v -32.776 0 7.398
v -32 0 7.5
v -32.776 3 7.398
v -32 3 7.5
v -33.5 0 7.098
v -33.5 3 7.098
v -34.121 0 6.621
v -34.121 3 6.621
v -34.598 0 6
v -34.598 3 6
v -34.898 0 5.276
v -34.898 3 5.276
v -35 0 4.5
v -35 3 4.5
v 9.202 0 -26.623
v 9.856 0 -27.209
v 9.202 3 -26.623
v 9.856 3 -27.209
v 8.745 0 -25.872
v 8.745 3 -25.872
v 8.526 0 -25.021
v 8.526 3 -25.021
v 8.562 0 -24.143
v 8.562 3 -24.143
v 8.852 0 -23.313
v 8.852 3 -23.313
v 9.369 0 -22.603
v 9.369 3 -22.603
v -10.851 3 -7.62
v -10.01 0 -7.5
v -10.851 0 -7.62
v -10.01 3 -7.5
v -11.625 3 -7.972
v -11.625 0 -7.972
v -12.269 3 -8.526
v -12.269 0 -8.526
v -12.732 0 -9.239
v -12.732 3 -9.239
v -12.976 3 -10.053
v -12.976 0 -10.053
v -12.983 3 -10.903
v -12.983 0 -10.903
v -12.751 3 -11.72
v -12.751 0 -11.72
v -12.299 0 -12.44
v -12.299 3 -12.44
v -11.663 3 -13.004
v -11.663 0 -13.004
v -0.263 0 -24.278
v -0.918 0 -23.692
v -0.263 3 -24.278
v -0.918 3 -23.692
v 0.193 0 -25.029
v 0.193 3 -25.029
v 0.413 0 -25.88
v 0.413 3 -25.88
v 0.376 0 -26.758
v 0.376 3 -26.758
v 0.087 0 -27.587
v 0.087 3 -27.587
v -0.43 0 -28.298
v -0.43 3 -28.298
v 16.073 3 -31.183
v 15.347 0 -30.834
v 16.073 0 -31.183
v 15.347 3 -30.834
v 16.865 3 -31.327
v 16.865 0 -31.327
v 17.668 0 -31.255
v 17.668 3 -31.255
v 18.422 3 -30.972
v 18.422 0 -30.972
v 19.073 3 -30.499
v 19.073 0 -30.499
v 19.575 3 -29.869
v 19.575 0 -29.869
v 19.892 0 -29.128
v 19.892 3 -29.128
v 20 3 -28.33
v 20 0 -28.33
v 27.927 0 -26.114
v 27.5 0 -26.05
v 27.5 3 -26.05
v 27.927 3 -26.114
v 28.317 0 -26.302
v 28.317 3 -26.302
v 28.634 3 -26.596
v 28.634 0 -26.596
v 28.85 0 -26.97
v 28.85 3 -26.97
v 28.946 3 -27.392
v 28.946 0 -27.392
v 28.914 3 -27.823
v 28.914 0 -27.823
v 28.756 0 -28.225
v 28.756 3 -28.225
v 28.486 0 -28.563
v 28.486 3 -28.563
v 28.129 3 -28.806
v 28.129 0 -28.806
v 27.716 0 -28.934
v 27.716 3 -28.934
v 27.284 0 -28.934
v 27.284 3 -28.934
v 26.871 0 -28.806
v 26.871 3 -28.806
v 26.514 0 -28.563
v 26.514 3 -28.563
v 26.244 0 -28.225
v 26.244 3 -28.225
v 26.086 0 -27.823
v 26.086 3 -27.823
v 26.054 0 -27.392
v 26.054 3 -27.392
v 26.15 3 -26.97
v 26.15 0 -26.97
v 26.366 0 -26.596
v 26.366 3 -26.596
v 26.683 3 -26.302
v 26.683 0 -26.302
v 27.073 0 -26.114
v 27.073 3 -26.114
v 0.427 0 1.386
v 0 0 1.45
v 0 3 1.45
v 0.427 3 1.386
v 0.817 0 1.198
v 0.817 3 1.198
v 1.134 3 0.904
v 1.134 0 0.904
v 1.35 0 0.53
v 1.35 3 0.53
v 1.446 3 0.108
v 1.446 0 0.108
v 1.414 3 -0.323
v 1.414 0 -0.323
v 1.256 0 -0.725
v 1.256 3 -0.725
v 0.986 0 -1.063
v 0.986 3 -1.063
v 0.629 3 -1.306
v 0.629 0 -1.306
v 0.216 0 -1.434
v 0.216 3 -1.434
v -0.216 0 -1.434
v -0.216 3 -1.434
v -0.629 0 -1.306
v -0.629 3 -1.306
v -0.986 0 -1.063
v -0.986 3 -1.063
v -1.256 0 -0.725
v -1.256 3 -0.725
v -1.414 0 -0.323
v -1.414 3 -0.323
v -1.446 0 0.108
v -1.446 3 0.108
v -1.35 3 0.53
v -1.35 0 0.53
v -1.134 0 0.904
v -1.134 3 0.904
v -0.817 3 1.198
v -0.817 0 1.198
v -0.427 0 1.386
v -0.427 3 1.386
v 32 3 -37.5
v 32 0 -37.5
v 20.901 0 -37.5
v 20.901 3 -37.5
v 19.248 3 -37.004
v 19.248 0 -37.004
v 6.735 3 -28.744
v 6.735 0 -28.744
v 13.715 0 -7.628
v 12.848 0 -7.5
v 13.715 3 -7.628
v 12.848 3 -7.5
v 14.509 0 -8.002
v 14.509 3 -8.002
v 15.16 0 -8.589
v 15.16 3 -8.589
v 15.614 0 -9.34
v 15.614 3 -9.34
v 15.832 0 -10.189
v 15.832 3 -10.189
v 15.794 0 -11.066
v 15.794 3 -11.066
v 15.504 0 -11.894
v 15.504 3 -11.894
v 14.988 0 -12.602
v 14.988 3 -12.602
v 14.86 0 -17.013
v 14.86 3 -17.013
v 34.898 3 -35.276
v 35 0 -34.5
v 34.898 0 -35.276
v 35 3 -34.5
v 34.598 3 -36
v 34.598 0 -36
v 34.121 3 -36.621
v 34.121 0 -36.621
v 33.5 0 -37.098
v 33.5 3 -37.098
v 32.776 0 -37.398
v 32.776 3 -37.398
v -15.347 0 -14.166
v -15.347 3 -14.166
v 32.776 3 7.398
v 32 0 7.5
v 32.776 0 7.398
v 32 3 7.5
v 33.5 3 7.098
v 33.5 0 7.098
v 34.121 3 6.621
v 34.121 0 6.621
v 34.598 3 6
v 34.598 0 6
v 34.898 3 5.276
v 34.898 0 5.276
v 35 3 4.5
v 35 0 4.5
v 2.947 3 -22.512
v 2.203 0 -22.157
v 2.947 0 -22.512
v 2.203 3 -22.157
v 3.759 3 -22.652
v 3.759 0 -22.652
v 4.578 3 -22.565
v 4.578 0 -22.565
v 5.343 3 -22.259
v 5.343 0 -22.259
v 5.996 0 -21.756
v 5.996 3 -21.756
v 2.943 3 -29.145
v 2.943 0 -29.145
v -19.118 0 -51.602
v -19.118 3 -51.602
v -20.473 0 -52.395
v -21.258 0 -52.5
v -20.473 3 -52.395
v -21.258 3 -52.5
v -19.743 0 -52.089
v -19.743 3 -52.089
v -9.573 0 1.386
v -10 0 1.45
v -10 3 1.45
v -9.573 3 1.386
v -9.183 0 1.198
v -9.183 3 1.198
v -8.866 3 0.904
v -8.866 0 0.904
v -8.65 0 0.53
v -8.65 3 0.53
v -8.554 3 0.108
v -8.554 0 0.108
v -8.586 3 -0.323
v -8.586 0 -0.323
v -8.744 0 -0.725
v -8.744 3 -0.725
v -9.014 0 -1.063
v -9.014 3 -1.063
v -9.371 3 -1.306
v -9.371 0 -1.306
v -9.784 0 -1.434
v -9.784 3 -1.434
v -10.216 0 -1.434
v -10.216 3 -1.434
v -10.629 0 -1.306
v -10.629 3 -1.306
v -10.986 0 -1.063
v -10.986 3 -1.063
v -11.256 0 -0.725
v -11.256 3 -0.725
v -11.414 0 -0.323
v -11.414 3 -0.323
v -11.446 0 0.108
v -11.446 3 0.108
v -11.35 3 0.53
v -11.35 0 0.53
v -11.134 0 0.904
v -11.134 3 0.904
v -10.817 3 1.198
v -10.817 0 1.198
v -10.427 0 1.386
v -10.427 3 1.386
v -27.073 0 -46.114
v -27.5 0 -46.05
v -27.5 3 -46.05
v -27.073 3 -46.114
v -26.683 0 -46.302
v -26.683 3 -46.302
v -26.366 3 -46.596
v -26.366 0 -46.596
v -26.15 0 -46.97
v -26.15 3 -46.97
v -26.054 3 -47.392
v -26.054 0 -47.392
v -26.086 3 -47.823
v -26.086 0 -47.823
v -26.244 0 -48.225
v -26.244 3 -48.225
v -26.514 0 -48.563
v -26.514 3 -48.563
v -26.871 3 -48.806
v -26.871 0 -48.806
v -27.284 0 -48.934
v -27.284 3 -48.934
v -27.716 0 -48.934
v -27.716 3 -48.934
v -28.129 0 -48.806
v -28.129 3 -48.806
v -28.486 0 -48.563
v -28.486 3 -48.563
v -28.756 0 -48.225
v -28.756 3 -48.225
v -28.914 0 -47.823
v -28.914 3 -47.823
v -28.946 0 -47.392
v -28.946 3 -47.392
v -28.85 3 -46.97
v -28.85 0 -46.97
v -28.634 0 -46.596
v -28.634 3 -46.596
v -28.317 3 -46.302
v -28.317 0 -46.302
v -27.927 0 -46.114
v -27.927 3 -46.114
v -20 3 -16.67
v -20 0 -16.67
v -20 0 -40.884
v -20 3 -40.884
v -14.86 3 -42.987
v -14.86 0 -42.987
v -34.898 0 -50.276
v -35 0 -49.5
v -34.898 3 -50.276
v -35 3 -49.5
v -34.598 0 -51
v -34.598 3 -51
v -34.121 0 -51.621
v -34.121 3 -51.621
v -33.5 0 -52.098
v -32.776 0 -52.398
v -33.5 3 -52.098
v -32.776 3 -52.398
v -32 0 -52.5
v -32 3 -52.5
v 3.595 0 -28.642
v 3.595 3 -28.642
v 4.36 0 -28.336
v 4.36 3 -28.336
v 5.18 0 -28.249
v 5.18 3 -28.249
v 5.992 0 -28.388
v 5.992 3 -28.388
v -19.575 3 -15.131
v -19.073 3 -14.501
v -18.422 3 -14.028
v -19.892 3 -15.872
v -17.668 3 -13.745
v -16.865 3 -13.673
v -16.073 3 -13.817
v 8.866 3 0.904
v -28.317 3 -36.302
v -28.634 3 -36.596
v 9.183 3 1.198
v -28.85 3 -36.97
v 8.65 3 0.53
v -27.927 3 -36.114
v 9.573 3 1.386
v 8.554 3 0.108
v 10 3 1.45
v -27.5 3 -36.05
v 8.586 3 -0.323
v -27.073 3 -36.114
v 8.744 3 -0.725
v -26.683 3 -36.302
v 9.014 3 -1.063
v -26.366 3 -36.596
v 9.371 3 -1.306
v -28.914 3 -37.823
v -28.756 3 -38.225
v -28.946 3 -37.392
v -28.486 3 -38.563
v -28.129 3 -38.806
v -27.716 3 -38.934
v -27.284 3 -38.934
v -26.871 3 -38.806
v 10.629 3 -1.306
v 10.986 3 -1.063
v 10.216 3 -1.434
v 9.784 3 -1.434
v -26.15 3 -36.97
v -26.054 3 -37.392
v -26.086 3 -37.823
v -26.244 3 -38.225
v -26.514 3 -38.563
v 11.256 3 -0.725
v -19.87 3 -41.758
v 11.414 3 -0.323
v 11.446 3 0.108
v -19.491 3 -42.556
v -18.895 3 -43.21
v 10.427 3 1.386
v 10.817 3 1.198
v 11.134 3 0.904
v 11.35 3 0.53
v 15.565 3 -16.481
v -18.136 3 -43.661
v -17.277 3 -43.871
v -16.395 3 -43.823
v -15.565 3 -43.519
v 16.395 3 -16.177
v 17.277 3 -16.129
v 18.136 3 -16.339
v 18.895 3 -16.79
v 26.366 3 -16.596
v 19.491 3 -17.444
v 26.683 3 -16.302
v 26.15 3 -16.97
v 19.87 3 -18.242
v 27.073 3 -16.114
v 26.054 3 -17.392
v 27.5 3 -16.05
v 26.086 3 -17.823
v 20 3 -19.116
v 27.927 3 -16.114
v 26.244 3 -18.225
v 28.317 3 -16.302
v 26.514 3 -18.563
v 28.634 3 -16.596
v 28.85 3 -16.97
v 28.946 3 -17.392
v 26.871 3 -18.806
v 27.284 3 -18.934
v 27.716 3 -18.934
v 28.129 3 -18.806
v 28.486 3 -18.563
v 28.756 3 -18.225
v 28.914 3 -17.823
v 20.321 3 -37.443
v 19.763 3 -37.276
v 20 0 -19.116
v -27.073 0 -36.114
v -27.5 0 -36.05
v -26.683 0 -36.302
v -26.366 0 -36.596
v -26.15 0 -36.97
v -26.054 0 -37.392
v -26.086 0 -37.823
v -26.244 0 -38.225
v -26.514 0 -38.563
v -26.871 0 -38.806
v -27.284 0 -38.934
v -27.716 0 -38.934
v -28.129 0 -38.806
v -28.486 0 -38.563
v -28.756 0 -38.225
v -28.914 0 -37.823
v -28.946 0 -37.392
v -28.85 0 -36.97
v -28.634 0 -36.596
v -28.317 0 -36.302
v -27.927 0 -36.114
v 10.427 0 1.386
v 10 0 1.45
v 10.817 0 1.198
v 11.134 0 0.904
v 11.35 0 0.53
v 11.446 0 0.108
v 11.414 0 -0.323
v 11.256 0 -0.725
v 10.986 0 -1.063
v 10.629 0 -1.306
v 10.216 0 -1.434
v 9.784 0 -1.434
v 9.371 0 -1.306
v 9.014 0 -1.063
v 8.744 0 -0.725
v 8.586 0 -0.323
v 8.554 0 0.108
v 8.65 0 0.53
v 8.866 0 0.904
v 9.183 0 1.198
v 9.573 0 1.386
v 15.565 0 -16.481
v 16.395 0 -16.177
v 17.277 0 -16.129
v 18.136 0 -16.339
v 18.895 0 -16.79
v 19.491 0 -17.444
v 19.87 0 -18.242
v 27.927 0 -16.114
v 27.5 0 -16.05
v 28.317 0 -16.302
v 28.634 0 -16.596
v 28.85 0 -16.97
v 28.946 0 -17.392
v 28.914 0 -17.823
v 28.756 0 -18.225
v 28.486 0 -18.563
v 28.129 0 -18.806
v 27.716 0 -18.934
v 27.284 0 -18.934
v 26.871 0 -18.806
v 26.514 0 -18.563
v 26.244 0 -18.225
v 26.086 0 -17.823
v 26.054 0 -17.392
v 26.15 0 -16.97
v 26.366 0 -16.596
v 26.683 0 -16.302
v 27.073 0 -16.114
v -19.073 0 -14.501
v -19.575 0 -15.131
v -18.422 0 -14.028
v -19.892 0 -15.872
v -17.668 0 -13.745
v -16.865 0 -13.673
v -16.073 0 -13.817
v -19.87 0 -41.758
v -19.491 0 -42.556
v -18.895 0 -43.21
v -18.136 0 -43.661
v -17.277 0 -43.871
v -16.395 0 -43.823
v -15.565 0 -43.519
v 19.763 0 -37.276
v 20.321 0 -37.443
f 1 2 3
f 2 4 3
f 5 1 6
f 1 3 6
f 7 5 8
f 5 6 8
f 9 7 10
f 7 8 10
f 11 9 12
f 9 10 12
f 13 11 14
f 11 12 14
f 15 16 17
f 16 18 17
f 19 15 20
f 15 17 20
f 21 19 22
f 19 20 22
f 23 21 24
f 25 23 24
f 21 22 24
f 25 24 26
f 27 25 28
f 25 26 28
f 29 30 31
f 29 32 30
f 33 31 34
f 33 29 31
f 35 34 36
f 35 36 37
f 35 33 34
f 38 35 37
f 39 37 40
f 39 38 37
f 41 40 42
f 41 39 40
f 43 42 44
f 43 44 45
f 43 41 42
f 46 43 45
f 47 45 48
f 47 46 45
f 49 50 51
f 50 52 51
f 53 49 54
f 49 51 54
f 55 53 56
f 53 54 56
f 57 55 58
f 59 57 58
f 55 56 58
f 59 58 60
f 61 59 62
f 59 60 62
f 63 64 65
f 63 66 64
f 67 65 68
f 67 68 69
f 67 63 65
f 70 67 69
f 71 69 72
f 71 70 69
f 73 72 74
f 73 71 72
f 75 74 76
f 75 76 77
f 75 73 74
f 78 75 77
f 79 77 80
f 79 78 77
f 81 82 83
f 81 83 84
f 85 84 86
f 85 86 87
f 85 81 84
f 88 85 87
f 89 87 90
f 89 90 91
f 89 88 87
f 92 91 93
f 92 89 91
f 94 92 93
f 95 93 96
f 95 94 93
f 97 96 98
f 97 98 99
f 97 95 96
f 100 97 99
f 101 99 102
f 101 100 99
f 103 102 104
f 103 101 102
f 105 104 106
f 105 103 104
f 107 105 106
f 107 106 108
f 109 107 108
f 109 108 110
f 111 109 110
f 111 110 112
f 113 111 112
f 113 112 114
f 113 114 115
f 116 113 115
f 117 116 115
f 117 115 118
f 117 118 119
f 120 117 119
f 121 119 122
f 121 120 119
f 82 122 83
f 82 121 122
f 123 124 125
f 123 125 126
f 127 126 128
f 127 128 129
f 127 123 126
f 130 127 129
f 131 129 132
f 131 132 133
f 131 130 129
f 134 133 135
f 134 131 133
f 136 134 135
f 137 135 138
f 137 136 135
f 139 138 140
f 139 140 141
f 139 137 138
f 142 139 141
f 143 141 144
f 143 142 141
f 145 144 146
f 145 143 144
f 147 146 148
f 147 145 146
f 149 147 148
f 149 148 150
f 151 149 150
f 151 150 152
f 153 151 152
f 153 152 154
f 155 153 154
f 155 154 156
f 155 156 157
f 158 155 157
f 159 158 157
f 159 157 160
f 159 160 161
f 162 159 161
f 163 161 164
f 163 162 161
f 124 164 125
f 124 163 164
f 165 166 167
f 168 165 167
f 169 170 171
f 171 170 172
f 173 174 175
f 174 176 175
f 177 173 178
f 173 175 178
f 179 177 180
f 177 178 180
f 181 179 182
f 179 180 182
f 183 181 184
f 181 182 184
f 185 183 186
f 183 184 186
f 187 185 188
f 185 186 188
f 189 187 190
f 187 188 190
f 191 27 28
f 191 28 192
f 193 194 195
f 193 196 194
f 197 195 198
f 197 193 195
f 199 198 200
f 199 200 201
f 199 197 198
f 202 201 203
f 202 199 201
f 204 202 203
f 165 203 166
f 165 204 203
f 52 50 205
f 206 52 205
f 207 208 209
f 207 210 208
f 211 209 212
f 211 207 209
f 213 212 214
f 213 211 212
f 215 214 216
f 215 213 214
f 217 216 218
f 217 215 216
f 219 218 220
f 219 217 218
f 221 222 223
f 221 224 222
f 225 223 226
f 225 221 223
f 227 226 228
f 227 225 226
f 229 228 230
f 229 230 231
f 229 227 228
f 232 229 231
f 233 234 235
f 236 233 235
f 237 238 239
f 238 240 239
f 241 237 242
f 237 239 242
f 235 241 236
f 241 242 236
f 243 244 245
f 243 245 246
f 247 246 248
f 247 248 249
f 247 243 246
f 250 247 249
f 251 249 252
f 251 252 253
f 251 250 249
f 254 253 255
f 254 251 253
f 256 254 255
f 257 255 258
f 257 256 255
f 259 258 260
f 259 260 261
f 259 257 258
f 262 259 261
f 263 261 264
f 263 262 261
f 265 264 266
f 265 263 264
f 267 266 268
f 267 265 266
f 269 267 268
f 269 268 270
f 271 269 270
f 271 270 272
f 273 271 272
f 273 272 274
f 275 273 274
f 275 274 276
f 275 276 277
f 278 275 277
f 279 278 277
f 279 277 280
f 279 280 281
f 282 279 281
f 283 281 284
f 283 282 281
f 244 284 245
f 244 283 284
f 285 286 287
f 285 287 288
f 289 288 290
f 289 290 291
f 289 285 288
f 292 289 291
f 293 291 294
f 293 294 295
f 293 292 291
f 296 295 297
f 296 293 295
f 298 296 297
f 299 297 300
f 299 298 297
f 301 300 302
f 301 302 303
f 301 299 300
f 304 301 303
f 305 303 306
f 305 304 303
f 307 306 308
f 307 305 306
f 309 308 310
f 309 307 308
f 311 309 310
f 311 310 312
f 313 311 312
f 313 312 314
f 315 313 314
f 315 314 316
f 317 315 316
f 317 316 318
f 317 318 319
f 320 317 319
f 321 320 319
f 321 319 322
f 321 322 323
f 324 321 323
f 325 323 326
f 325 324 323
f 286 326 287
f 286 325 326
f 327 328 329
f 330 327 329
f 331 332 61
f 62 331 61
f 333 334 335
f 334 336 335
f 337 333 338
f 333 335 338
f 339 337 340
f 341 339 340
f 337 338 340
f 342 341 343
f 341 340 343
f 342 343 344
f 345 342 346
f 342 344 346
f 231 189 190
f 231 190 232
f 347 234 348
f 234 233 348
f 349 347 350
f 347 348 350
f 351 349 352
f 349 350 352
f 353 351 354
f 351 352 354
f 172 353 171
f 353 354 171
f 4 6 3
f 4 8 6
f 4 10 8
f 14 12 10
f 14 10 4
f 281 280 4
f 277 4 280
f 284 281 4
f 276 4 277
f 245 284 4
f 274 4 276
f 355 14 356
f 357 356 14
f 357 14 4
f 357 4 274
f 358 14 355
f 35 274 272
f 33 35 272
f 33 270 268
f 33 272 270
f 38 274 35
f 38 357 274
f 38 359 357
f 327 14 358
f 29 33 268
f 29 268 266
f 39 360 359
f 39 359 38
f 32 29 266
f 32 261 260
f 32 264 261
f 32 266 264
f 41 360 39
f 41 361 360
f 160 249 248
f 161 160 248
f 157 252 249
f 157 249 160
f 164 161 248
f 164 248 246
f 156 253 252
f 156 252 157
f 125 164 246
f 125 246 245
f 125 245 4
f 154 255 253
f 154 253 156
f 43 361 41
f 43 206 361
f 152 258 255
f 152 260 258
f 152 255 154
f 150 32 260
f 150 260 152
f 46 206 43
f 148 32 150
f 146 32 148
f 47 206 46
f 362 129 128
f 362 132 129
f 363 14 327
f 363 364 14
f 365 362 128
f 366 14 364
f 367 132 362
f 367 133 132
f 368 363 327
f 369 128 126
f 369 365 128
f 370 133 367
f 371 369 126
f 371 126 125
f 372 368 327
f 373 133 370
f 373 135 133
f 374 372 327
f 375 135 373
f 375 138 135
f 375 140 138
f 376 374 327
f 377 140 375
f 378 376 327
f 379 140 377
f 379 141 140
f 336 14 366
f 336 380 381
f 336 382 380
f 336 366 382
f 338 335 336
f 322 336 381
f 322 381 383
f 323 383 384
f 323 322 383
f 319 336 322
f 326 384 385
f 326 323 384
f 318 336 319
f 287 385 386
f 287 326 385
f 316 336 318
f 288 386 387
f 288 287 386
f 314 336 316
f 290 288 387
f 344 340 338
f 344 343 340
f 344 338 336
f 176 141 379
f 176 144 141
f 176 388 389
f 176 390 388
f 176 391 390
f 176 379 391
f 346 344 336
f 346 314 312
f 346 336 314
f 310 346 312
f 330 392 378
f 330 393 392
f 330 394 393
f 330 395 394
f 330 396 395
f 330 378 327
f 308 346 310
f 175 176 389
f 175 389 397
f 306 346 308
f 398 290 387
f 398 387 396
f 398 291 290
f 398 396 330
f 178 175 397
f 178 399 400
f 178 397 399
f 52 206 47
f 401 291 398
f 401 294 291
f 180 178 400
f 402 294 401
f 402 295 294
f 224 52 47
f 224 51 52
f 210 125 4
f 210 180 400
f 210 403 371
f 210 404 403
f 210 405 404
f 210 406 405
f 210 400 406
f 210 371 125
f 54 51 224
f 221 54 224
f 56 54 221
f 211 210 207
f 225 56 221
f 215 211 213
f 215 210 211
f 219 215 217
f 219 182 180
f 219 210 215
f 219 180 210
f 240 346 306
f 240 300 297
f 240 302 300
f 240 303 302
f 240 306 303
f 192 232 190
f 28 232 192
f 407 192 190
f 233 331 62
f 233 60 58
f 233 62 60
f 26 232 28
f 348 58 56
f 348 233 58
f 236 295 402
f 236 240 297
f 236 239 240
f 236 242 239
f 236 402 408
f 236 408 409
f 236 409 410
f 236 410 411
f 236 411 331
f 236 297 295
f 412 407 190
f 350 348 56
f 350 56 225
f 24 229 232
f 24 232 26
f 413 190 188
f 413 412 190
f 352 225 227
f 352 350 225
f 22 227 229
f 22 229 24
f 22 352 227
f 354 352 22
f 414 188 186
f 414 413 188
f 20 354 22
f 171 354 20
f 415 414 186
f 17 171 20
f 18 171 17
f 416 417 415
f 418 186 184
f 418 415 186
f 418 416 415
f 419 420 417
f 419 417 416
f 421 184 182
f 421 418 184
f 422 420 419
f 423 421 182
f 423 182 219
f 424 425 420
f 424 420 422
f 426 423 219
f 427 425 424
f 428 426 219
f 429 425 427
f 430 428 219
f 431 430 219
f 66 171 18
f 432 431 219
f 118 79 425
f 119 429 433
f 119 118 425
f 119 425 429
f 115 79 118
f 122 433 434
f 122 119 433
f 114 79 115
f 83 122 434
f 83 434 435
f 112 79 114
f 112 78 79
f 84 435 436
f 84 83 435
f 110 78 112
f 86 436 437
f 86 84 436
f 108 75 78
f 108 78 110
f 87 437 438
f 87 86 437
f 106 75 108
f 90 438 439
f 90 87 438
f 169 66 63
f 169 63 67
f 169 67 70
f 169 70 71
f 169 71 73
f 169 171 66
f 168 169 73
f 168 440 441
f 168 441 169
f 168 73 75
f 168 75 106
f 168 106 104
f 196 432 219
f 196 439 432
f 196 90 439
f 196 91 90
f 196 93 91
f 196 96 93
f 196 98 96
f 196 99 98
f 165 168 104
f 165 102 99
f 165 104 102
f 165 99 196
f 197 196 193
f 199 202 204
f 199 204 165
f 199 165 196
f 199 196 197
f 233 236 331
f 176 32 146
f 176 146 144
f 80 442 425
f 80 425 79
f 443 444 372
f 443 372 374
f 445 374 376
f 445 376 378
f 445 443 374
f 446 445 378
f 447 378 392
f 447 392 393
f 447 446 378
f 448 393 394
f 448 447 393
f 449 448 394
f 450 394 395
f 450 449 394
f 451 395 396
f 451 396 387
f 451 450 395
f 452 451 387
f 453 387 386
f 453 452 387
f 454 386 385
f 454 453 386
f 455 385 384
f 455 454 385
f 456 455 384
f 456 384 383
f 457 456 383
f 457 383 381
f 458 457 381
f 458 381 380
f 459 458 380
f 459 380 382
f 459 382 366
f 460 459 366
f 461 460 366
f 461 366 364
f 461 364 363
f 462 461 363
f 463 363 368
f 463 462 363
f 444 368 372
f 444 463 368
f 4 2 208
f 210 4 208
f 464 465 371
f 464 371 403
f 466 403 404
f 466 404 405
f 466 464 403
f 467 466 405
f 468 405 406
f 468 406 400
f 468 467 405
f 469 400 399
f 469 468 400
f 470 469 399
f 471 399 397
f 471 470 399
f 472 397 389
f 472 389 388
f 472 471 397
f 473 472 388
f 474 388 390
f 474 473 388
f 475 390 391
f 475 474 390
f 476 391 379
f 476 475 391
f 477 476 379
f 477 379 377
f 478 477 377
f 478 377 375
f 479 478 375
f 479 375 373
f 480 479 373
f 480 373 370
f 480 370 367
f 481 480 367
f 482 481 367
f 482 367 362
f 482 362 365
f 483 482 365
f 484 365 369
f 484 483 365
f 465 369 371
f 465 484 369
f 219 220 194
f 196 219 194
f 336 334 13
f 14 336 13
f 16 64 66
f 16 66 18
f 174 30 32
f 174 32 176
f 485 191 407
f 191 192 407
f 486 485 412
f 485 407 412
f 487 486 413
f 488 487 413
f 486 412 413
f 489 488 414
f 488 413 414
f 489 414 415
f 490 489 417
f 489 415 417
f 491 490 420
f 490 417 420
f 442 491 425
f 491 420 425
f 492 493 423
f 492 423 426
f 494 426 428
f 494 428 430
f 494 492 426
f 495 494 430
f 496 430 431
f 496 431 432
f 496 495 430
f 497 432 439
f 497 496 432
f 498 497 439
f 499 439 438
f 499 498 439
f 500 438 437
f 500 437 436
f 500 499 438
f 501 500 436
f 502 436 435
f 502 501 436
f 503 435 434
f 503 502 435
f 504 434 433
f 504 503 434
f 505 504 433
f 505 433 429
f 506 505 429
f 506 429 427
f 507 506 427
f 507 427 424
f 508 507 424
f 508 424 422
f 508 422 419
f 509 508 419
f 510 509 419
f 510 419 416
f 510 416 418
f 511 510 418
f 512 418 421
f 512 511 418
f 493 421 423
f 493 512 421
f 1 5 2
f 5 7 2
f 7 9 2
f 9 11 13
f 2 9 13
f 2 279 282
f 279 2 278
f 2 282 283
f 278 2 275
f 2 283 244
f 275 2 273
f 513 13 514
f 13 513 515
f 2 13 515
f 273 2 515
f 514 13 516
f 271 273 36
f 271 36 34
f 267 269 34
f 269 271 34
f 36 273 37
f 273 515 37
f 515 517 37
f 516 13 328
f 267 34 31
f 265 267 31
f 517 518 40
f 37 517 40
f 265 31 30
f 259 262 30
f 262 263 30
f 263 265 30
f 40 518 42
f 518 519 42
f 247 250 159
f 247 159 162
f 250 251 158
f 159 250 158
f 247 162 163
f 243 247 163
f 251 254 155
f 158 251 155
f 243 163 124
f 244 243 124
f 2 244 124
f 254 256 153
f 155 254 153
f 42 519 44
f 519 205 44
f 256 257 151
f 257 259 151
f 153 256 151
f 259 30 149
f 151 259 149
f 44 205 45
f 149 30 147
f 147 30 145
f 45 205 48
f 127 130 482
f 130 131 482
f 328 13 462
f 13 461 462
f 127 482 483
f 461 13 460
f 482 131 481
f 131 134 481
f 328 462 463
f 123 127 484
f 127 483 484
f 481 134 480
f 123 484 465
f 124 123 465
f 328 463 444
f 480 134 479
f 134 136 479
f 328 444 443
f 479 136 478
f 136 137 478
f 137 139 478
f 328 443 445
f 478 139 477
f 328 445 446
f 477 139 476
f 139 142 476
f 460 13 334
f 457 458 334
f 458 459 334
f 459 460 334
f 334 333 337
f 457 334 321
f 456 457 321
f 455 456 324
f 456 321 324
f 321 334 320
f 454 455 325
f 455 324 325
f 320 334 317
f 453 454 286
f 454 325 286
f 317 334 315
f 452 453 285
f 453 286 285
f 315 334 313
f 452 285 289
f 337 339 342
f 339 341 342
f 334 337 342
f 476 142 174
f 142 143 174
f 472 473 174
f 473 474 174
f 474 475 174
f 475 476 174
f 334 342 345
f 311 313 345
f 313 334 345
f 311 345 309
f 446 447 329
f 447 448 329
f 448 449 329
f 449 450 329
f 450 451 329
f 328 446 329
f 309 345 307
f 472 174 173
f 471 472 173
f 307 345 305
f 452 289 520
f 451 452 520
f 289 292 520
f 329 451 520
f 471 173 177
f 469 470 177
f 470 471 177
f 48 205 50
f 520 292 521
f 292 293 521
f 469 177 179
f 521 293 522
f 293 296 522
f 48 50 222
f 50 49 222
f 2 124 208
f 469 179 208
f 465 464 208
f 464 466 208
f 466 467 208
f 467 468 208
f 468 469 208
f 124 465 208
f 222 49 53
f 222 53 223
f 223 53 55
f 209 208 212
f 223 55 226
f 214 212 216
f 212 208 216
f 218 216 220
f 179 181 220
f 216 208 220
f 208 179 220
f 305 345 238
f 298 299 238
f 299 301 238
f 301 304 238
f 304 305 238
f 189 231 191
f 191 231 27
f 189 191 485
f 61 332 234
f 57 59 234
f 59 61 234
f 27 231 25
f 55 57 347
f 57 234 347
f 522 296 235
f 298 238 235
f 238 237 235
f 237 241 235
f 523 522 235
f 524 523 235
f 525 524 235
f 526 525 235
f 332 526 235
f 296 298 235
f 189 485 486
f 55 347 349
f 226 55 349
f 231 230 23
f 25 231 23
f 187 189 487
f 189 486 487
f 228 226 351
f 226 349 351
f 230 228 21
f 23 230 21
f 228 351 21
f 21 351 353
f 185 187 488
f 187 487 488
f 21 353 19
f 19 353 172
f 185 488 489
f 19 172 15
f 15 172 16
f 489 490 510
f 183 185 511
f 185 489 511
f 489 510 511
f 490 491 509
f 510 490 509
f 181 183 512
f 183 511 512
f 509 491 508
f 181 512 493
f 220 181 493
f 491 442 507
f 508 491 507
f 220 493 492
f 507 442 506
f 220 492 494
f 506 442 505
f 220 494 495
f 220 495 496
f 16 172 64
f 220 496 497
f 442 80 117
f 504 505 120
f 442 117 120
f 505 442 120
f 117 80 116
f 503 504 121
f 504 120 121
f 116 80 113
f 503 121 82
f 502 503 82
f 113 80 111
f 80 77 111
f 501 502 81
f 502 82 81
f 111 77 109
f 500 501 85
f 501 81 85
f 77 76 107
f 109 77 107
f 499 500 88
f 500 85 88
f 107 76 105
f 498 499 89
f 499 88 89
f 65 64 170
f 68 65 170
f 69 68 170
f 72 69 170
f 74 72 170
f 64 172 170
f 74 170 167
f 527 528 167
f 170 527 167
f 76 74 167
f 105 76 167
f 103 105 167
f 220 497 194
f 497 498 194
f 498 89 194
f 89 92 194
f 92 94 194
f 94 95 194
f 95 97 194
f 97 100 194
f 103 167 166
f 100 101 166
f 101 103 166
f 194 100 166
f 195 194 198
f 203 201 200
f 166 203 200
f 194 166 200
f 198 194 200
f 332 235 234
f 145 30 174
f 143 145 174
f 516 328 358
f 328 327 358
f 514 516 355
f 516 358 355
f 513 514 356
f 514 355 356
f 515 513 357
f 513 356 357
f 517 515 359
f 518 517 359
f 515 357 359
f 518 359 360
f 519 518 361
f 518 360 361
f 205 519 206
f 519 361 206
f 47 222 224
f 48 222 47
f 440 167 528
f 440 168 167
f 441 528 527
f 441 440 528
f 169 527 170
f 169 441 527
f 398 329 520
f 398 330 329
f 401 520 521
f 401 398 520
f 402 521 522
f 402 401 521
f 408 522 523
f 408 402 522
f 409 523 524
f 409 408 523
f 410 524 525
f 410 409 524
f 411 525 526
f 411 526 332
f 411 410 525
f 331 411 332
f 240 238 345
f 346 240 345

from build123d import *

# Parameters (mm, degrees)
SKETCH_1_R      = 1.45
EXTRUDE_1_DEPTH = 3
FILLET_1_R      = 3


with BuildPart() as part:
    # 草图1 → 凸台-拉伸1 (new body)
    with BuildSketch(Plane(origin=(0, 0, 0), x_dir=(1, 0, 0), z_dir=(0, 1, 0))):
        Polygon((-35, -7.5), (35, -7.5), (35, 37.5), (20, 37.5), (4.673782914, 27.382671433), (-20, 52.5), (-35, 52.5), align=None)
        with Locations(Location((-27.5, 37.5, 0), (0, 0, 270))):
            Circle(SKETCH_1_R, mode=Mode.SUBTRACT)
        with Locations(Location((-27.5, 47.5, 0), (0, 0, 270))):
            Circle(SKETCH_1_R, mode=Mode.SUBTRACT)
        with Locations(Location((27.5, 27.5, 0), (0, 0, 270))):
            Circle(SKETCH_1_R, mode=Mode.SUBTRACT)
        with Locations(Location((27.5, 17.5, 0), (0, 0, 270))):
            Circle(SKETCH_1_R, mode=Mode.SUBTRACT)
        with Locations(Location((0, 0, 0), (0, 0, 270))):
            Circle(SKETCH_1_R, mode=Mode.SUBTRACT)
        with Locations(Location((10, 0, 0), (0, 0, 270))):
            Circle(SKETCH_1_R, mode=Mode.SUBTRACT)
        with Locations(Location((-10, 0, 0), (0, 0, 270))):
            Circle(SKETCH_1_R, mode=Mode.SUBTRACT)
        Polygon((-20, 7.5), (20, 7.5), (4.264852248, 23.518008974), align=None, mode=Mode.SUBTRACT)
        Polygon((-20, 48.219055775), (2.122729676, 25.698639186), (-20, 11.094714181), align=None, mode=Mode.SUBTRACT)
        Polygon((20, 33.905285819), (6.815905486, 25.202041221), (20, 11.780944225), align=None, mode=Mode.SUBTRACT)
    extrude(amount=EXTRUDE_1_DEPTH)

    # 圆角1
    fillet_1_edges = [part.edges().sort_by_distance(p)[0] for p in [
        (-20, 1.5, -7.5),
        (20, 1.5, -7.5),
        (4.264852248, 1.5, -23.518008974),
        (2.122729676, 1.5, -25.698639186),
        (-20, 1.5, -48.219055775),
        (-20, 1.5, -11.094714181),
        (20, 1.5, -37.5),
        (35, 1.5, -37.5),
        (35, 1.5, 7.5),
        (-35, 1.5, 7.5),
        (-35, 1.5, -52.5),
        (-20, 1.5, -52.5),
        (4.673782914, 1.5, -27.382671433),
        (20, 1.5, -33.905285819),
        (6.815905486, 1.5, -25.202041221),
        (20, 1.5, -11.780944225),
    ]]
    fillet(fillet_1_edges, radius=FILLET_1_R)


solid = part.part
